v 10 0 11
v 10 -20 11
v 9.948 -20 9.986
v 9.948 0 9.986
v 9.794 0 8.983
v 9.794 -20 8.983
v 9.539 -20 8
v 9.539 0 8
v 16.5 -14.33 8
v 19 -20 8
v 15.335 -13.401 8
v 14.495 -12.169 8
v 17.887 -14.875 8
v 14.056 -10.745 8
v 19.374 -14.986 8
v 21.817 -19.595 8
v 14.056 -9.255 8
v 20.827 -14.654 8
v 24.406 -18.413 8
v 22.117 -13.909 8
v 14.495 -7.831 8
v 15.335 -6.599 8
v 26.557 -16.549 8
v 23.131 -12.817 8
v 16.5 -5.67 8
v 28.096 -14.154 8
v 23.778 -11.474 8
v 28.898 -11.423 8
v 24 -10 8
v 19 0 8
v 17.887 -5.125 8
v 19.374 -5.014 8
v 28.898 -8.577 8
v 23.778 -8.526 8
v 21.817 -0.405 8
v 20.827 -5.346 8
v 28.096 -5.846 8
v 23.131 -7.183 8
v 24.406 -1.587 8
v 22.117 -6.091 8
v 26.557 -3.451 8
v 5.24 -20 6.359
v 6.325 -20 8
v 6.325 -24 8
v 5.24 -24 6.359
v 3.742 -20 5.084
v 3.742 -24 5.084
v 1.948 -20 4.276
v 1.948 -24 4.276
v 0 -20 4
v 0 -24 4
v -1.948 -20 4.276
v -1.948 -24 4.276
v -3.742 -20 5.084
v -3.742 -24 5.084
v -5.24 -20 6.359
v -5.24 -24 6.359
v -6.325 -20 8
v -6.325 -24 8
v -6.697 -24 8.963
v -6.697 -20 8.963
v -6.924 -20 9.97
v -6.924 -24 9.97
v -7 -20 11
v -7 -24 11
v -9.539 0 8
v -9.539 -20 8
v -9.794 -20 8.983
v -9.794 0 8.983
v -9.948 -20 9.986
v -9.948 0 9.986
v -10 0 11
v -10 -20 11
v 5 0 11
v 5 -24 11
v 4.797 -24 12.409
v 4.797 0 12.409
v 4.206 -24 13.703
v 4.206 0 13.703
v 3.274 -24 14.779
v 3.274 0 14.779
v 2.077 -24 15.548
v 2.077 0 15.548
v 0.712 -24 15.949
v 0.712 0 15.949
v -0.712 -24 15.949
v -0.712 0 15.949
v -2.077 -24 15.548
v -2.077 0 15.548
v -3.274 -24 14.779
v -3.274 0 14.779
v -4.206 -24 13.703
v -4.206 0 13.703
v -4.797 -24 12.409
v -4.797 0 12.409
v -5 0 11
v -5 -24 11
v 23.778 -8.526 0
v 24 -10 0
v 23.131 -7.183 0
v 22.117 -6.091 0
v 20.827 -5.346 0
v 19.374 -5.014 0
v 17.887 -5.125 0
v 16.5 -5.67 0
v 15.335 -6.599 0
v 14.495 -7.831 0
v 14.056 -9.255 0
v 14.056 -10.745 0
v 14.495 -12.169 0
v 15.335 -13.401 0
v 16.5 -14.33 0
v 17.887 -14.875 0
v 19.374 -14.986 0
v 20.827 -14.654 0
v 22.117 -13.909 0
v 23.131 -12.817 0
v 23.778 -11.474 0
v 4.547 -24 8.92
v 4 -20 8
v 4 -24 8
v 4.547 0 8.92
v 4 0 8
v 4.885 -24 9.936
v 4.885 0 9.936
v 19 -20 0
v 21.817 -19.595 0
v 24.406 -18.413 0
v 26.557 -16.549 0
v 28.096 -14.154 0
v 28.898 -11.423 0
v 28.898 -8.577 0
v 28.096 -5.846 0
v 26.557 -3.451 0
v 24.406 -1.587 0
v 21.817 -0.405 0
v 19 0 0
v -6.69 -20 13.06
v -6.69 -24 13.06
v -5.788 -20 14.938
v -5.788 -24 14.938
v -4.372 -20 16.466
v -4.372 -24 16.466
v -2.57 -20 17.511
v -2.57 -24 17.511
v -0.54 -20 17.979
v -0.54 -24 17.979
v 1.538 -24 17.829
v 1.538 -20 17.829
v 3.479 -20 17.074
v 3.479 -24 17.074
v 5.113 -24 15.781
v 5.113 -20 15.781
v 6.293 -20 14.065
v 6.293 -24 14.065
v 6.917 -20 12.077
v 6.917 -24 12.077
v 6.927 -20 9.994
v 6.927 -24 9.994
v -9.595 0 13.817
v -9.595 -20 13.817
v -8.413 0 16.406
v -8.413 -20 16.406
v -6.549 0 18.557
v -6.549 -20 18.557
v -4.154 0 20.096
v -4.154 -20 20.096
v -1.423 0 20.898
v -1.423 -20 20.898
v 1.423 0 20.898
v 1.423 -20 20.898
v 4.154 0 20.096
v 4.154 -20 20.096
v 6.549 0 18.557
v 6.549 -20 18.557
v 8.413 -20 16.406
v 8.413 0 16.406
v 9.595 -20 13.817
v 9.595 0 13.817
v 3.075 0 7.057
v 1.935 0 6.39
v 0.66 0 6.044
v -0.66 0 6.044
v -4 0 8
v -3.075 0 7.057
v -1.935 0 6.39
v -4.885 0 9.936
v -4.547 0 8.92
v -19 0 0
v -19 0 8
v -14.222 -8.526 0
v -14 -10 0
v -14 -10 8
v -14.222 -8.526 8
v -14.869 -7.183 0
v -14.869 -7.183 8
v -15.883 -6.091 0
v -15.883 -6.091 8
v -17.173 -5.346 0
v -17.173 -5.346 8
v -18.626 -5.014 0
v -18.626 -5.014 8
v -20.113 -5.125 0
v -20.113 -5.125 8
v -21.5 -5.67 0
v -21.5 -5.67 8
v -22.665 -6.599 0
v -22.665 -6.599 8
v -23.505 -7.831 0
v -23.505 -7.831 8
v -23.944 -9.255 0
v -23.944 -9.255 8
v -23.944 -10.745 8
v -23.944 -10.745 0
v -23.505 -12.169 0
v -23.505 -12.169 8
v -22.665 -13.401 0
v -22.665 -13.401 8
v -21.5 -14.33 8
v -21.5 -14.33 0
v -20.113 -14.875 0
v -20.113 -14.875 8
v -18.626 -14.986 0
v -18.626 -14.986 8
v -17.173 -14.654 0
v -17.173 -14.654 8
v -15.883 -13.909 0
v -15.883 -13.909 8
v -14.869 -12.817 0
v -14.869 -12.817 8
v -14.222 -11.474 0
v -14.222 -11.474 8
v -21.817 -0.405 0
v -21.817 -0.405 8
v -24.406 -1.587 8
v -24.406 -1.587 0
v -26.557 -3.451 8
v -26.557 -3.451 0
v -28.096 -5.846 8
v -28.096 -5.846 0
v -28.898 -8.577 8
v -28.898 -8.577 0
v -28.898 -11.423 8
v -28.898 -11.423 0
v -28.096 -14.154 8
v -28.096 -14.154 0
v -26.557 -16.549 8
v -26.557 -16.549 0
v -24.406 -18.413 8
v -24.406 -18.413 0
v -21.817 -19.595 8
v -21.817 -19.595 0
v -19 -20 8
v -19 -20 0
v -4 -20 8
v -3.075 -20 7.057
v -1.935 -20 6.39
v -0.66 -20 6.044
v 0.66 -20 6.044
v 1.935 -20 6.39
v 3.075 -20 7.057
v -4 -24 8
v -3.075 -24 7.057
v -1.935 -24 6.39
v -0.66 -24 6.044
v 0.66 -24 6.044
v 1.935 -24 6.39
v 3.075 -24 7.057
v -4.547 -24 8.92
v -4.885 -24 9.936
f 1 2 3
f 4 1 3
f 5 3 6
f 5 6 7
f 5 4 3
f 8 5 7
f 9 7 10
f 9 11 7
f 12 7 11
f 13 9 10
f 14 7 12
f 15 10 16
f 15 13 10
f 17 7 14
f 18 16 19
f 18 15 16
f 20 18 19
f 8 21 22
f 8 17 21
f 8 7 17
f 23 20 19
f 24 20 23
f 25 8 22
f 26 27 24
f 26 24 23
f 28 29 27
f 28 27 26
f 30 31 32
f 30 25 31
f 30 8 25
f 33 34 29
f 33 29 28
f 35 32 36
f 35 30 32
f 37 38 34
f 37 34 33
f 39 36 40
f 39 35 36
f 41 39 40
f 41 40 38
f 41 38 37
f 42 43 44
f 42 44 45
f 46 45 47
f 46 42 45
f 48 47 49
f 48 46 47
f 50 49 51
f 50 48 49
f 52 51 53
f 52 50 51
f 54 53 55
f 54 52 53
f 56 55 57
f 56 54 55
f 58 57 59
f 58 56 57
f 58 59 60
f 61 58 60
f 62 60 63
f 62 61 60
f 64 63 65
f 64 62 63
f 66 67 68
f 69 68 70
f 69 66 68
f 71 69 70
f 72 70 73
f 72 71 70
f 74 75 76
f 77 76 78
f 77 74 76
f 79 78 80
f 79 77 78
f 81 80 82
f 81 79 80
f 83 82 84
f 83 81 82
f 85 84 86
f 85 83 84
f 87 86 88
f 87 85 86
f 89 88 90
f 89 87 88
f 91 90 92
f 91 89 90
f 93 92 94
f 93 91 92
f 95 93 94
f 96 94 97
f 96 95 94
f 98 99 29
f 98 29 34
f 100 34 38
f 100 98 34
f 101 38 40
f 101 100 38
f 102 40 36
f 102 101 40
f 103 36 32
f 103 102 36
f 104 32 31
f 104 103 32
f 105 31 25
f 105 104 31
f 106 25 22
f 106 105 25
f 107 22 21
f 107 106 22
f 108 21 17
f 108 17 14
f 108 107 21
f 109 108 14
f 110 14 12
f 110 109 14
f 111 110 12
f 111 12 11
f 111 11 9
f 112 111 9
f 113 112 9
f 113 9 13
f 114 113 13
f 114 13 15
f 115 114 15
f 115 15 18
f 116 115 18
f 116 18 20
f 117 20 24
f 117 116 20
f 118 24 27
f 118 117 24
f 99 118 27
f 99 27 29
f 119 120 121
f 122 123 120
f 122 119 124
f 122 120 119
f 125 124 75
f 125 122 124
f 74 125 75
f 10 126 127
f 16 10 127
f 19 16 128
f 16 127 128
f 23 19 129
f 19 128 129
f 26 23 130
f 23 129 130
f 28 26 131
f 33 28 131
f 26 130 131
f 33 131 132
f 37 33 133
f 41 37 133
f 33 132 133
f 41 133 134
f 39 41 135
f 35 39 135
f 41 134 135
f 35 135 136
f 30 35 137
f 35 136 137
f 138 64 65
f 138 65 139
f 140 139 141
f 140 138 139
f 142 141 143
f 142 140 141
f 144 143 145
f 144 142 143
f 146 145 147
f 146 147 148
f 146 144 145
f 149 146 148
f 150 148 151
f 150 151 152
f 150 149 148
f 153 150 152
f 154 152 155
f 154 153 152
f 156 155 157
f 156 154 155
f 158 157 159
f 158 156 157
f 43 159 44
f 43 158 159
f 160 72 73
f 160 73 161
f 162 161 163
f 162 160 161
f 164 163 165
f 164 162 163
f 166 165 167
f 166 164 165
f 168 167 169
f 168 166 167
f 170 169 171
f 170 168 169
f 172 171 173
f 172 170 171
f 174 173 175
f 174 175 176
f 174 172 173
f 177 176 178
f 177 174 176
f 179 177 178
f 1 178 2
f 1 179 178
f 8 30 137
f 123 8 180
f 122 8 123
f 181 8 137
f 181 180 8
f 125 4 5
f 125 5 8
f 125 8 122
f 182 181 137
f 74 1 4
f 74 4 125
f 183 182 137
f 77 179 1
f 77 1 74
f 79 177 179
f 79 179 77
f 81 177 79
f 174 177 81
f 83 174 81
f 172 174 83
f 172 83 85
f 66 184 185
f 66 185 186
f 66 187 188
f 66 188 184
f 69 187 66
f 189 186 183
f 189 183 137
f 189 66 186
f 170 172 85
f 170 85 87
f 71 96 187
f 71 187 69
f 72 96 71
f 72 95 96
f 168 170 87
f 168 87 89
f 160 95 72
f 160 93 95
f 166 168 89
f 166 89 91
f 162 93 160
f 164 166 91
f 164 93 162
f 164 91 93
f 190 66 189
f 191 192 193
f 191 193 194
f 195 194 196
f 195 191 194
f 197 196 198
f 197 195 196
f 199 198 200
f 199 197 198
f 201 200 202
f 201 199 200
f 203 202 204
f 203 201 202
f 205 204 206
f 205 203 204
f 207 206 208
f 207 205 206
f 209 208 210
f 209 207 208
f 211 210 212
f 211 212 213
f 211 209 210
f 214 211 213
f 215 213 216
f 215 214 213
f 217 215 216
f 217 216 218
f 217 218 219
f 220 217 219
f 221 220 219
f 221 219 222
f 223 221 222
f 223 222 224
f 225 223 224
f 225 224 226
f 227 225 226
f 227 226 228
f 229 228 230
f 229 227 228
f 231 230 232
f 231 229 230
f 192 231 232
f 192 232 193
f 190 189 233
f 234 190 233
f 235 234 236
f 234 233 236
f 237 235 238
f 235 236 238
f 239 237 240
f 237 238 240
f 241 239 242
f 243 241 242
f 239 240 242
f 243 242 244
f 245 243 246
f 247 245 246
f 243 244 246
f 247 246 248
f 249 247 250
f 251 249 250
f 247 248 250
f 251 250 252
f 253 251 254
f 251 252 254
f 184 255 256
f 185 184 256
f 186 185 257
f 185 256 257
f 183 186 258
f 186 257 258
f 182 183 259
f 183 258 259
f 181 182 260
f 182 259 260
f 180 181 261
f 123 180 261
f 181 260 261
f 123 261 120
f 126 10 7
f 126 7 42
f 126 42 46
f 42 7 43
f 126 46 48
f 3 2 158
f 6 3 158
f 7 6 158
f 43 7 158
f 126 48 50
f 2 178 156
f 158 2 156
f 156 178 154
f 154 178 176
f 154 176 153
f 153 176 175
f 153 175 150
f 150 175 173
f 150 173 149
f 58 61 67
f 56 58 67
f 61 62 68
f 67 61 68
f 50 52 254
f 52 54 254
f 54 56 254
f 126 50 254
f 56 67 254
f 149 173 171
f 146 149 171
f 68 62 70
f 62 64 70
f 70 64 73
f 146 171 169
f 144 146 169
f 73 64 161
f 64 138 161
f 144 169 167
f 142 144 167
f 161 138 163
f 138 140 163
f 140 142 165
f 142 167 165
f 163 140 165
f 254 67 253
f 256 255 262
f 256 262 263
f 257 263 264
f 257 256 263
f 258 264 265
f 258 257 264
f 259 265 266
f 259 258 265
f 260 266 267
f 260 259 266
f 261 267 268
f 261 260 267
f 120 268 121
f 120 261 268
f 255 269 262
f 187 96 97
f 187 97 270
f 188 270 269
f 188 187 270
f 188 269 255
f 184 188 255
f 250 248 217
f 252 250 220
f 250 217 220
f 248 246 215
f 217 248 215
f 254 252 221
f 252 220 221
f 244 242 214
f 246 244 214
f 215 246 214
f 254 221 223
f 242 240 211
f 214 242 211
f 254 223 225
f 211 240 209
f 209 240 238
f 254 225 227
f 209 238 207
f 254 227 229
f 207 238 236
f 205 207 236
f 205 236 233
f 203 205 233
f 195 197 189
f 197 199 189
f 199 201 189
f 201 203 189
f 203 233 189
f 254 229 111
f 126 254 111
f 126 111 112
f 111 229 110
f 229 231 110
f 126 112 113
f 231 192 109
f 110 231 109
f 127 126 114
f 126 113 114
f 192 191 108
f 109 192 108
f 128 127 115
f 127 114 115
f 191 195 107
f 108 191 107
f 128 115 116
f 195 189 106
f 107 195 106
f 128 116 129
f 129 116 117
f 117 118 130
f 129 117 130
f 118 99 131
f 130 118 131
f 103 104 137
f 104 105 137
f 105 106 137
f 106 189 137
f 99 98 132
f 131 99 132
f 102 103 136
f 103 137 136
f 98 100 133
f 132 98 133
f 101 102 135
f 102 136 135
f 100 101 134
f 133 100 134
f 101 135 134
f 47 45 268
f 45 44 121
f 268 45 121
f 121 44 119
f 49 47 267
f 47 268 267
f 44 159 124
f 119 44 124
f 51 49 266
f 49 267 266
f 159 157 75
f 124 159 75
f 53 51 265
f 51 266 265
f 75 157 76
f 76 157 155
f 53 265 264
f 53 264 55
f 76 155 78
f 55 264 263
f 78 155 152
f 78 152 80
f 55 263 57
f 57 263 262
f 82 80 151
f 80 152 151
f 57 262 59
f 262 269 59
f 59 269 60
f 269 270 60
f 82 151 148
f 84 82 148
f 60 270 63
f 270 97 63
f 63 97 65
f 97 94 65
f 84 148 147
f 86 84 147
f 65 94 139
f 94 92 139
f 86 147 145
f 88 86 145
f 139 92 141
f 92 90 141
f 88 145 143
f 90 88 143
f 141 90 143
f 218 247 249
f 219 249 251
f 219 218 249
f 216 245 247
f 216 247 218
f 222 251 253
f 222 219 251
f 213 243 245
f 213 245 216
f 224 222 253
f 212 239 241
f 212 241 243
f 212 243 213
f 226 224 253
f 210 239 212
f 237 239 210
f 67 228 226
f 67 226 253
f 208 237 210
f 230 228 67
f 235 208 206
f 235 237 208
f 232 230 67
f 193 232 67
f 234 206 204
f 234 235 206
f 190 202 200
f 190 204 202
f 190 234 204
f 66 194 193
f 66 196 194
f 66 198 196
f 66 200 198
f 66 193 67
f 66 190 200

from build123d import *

# Parameters (mm, degrees)
F0_R     = 5
F1_DEPTH = 8
F3_DEPTH = 24
F4_DEPTH = 20
F5_D     = 10
F5_DEPTH = 24
F5_TIP   = 3.0043030951


with BuildPart() as f1:
    # F0 (on Top) → F1 (new body)
    with BuildSketch(Plane.XY):
        with BuildLine():
            Line((19, 0), (0, 0))
            Line((0, 0), (-19, 0))
            ThreePointArc((-19, 0), (-29, -10), (-19, -20))
            Line((-19, -20), (0, -20))
            Line((0, -20), (19, -20))
            ThreePointArc((19, -20), (29, -10), (19, 0))
        make_face()
        with Locations((-19, -10)):
            Circle(F0_R, mode=Mode.SUBTRACT)
        with Locations((19, -10)):
            Circle(F0_R, mode=Mode.SUBTRACT)
    extrude(amount=F1_DEPTH)

    # F2 (on face) → F3 (join)
    with BuildSketch(Plane(origin=(0, 0, 0), x_dir=(-1, 0, 0), z_dir=(0, 1, 0))):
        with BuildLine():
            ThreePointArc((4, 8), (0, 6), (-4, 8))
            Line((-4, 8), (-6.3245553203, 8))
            ThreePointArc((-6.3245553203, 8), (0, 4), (6.3245553203, 8))
            Line((6.3245553203, 8), (4, 8))
        make_face()
        with BuildLine():
            ThreePointArc((-4, 8), (-1.5811388301, 15.7434164903), (5, 11))
            ThreePointArc((5, 11), (4.7434164903, 9.4188611699), (4, 8))
            Line((4, 8), (6.3245553203, 8))
            ThreePointArc((6.3245553203, 8), (6.8290514437, 9.4624511784), (7, 11))
            ThreePointArc((7, 11), (-1.5375488216, 17.8290514437), (-6.3245553203, 8))
            Line((-6.3245553203, 8), (-4, 8))
        make_face()
    extrude(amount=-F3_DEPTH)

    # F2 (on face) → F4 (join)
    with BuildSketch(Plane(origin=(0, 0, 0), x_dir=(-1, 0, 0), z_dir=(0, 1, 0))):
        with BuildLine():
            Line((-9.5393920142, 8), (-6.3245553203, 8))
            ThreePointArc((-6.3245553203, 8), (-1.5375488216, 17.8290514437), (7, 11))
            ThreePointArc((7, 11), (6.8290514437, 9.4624511784), (6.3245553203, 8))
            Line((6.3245553203, 8), (9.5393920142, 8))
            ThreePointArc((9.5393920142, 8), (9.8841772582, 9.4824230072), (10, 11))
            ThreePointArc((10, 11), (0, 21), (-10, 11))
            ThreePointArc((-10, 11), (-9.8841772582, 9.4824230072), (-9.5393920142, 8))
        make_face()
    extrude(amount=-F4_DEPTH)

    # F5
    with Locations(Plane(origin=(0, 0, 0), x_dir=(-1, 0, 0), z_dir=(0, 1, 0))):
        with Locations((0, 11)):
            Hole(F5_D / 2, depth=F5_DEPTH)
            with Locations((0, 0, -(F5_DEPTH + F5_TIP / 2))):  # 118° drill point
                Cone(0, F5_D / 2, F5_TIP, mode=Mode.SUBTRACT)


solid = f1.part
